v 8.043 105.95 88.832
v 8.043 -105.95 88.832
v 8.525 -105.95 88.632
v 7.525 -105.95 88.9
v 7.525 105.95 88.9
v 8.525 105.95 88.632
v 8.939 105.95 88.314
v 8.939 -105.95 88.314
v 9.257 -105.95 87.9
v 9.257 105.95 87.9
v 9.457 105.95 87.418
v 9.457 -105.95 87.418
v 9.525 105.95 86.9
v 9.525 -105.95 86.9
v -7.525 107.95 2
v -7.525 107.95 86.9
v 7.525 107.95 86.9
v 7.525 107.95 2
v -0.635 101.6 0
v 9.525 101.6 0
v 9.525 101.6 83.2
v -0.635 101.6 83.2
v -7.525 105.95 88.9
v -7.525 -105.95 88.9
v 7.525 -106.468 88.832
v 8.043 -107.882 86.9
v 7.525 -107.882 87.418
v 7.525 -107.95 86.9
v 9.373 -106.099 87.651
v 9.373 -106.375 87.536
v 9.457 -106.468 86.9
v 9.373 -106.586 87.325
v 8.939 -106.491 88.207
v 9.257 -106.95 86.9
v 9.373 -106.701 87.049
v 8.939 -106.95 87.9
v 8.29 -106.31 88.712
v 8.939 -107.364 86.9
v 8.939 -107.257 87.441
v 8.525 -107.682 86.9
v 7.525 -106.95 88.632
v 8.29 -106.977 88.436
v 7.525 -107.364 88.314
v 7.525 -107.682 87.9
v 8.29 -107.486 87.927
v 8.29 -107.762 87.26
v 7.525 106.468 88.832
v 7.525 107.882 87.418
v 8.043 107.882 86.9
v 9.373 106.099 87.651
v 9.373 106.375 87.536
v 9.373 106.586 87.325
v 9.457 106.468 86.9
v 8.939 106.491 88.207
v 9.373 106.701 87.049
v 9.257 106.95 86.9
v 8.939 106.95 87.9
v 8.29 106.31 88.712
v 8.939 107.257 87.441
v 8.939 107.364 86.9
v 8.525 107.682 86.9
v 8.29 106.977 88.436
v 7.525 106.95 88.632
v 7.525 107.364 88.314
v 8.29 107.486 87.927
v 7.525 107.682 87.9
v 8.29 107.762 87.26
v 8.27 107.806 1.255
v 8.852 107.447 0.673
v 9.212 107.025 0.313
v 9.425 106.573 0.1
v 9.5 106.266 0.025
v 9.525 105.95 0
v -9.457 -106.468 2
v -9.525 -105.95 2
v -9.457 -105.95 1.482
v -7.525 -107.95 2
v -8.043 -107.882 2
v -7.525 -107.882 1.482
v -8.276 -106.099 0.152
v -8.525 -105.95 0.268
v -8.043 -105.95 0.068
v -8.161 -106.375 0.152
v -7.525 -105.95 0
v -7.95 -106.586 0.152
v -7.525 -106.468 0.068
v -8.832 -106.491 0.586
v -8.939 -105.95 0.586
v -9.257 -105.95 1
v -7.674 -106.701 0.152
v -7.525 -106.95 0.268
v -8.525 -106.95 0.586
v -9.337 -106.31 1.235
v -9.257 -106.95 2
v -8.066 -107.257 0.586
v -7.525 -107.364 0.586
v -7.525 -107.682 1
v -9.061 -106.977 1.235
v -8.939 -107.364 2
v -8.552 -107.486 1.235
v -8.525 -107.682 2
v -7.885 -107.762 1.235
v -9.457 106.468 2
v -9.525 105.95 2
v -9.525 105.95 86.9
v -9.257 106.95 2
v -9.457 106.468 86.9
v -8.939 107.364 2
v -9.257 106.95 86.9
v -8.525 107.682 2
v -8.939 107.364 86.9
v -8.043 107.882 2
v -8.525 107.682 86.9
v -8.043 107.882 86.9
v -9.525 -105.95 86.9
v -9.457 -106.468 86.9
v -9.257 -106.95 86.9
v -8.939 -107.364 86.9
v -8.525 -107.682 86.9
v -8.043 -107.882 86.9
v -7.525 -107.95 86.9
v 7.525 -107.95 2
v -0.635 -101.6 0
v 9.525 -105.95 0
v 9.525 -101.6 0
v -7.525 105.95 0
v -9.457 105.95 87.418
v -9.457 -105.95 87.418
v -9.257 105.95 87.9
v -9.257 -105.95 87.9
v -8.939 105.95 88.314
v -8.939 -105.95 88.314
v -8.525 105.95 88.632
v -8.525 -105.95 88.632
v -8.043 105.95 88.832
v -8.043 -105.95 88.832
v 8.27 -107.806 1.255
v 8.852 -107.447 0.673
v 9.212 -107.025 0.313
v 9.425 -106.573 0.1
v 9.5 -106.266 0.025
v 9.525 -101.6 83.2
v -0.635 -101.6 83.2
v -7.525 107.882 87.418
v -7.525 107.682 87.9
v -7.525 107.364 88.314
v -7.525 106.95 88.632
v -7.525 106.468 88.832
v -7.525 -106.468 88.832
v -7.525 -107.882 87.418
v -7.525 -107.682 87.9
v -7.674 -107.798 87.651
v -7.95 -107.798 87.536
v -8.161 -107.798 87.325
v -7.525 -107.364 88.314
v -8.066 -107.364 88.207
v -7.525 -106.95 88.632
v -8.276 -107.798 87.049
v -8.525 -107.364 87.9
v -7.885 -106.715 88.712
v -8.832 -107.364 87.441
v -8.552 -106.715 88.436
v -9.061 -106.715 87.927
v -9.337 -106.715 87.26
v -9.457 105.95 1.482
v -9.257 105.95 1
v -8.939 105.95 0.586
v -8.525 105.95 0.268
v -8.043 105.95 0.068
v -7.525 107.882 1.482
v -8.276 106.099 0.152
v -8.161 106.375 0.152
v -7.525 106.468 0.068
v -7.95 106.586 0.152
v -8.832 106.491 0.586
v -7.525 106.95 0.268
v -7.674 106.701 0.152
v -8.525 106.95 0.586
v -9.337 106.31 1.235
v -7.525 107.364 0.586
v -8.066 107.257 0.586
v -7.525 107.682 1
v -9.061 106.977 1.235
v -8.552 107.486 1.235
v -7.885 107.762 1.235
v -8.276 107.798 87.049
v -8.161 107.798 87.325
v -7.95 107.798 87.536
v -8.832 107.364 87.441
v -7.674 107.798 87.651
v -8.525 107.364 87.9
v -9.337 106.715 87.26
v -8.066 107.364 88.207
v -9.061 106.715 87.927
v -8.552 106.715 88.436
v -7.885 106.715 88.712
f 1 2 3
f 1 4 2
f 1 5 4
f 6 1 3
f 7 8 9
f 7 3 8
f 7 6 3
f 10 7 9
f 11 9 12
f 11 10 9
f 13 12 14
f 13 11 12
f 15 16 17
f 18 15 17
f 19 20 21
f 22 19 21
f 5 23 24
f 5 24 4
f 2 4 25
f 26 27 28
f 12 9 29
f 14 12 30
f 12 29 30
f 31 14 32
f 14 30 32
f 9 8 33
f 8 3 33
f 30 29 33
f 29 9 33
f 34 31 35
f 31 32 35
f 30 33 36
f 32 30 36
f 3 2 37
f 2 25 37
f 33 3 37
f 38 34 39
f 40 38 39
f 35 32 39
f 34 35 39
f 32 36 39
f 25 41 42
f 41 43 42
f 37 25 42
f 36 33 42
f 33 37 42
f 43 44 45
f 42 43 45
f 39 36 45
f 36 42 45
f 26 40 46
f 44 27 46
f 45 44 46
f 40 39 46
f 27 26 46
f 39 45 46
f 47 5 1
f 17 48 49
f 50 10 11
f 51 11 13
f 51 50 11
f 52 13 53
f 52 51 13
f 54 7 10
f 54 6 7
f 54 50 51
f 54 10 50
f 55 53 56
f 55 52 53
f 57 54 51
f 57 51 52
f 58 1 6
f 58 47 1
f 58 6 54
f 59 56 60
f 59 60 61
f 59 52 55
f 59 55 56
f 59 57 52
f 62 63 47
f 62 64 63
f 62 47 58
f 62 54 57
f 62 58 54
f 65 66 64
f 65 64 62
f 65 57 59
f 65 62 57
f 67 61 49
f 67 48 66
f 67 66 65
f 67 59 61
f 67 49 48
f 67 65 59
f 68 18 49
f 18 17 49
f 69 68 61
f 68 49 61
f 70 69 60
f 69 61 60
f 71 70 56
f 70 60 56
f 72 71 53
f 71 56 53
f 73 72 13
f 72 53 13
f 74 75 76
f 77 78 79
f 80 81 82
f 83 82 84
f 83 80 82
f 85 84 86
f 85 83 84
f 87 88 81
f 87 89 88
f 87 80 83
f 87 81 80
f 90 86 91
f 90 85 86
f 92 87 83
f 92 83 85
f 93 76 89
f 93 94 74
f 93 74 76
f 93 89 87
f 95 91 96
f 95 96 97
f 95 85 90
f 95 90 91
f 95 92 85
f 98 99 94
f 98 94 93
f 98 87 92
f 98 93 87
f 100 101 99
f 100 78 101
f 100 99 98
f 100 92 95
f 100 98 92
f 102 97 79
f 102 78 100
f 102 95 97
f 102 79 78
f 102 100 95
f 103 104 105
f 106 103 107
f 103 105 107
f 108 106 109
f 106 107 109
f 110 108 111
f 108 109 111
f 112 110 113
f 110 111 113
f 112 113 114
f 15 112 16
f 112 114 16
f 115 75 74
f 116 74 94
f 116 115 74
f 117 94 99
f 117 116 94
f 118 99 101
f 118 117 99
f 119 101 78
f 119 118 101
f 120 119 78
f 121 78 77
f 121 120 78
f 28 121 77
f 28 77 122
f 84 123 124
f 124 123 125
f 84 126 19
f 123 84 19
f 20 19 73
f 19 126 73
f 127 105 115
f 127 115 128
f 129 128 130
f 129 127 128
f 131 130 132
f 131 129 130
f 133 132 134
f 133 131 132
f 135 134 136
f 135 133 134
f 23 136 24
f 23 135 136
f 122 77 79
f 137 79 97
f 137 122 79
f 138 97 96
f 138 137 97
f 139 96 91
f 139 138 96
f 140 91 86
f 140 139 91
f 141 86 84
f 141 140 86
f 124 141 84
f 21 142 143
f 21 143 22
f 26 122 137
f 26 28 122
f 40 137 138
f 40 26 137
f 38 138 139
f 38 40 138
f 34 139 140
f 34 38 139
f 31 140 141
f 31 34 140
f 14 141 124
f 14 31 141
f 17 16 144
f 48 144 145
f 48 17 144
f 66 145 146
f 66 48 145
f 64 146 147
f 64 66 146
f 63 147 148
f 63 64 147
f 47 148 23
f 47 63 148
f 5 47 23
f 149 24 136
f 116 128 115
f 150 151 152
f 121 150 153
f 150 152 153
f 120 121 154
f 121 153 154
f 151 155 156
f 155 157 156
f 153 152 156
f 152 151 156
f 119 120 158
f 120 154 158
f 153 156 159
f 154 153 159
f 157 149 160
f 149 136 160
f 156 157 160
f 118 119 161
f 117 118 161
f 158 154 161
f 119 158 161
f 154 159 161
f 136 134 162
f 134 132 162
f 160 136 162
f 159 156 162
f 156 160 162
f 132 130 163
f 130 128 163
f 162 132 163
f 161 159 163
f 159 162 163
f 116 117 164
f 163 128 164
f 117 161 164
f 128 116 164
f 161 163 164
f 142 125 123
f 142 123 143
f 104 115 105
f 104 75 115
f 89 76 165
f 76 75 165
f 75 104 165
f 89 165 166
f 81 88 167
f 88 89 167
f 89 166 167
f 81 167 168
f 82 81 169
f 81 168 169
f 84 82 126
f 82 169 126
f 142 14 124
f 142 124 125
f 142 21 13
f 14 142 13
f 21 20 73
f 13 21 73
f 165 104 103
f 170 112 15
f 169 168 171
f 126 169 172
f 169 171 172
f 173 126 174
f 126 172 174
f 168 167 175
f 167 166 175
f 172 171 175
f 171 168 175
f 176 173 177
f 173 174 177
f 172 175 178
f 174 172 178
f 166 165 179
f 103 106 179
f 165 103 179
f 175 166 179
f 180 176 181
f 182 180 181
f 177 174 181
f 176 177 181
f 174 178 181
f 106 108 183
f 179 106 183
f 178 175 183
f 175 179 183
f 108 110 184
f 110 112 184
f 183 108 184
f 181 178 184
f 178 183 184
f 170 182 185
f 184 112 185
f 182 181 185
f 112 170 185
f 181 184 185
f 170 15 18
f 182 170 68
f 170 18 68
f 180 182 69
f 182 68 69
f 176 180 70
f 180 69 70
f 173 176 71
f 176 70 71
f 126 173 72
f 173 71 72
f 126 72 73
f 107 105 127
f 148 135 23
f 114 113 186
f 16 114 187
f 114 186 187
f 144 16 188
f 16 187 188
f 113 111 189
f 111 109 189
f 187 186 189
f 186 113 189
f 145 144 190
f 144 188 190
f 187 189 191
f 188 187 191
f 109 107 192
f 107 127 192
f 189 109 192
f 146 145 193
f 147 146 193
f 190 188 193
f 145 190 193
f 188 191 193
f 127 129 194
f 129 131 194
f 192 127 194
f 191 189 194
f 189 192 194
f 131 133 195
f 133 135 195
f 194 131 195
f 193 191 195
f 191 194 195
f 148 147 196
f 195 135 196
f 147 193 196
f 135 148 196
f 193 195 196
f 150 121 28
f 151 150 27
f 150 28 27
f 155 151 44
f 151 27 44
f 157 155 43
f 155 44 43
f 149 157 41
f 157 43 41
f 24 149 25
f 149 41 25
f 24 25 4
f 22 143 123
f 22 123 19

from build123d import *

# Parameters (mm, degrees)
F0_W     = 19.05
F0_H     = 215.9
F1_DEPTH = 88.9
F2_W     = 203.2
F2_H     = 83.2
F3_DEPTH = 10.16
F4_R     = 2


# Not quite as in the source:
# - a feature names something its author has since deleted; it is built from what else it names


with BuildPart() as f1:
    # F0 (on Top) → F1 (new body)
    with BuildSketch(Plane.XY):
        Rectangle(F0_W, F0_H)
    extrude(amount=F1_DEPTH)

    # F2 (on face) → F3 (cut)
    with BuildSketch(Plane.YZ.offset(9.525)):
        with Locations((0, 41.6)):
            Rectangle(F2_W, F2_H)
    extrude(amount=-F3_DEPTH, mode=Mode.SUBTRACT)

    # F4
    f4_edges = [f1.edges().sort_by_distance(p)[0] for p in [
        (-9.525, 0, 88.9),
        (0, -107.95, 88.9),
        (-9.525, -107.95, 44.45),
        (-9.525, 107.95, 44.45),
        (0, 107.95, 88.9),
        (9.525, 0, 88.9),
        (9.525, -107.95, 44.45),
        (9.525, 107.95, 44.45),
        (-9.525, 0, 0),
        (0, 107.95, 0),
        (0, -107.95, 0),
    ]]
    fillet(f4_edges, radius=F4_R)


solid = f1.part
